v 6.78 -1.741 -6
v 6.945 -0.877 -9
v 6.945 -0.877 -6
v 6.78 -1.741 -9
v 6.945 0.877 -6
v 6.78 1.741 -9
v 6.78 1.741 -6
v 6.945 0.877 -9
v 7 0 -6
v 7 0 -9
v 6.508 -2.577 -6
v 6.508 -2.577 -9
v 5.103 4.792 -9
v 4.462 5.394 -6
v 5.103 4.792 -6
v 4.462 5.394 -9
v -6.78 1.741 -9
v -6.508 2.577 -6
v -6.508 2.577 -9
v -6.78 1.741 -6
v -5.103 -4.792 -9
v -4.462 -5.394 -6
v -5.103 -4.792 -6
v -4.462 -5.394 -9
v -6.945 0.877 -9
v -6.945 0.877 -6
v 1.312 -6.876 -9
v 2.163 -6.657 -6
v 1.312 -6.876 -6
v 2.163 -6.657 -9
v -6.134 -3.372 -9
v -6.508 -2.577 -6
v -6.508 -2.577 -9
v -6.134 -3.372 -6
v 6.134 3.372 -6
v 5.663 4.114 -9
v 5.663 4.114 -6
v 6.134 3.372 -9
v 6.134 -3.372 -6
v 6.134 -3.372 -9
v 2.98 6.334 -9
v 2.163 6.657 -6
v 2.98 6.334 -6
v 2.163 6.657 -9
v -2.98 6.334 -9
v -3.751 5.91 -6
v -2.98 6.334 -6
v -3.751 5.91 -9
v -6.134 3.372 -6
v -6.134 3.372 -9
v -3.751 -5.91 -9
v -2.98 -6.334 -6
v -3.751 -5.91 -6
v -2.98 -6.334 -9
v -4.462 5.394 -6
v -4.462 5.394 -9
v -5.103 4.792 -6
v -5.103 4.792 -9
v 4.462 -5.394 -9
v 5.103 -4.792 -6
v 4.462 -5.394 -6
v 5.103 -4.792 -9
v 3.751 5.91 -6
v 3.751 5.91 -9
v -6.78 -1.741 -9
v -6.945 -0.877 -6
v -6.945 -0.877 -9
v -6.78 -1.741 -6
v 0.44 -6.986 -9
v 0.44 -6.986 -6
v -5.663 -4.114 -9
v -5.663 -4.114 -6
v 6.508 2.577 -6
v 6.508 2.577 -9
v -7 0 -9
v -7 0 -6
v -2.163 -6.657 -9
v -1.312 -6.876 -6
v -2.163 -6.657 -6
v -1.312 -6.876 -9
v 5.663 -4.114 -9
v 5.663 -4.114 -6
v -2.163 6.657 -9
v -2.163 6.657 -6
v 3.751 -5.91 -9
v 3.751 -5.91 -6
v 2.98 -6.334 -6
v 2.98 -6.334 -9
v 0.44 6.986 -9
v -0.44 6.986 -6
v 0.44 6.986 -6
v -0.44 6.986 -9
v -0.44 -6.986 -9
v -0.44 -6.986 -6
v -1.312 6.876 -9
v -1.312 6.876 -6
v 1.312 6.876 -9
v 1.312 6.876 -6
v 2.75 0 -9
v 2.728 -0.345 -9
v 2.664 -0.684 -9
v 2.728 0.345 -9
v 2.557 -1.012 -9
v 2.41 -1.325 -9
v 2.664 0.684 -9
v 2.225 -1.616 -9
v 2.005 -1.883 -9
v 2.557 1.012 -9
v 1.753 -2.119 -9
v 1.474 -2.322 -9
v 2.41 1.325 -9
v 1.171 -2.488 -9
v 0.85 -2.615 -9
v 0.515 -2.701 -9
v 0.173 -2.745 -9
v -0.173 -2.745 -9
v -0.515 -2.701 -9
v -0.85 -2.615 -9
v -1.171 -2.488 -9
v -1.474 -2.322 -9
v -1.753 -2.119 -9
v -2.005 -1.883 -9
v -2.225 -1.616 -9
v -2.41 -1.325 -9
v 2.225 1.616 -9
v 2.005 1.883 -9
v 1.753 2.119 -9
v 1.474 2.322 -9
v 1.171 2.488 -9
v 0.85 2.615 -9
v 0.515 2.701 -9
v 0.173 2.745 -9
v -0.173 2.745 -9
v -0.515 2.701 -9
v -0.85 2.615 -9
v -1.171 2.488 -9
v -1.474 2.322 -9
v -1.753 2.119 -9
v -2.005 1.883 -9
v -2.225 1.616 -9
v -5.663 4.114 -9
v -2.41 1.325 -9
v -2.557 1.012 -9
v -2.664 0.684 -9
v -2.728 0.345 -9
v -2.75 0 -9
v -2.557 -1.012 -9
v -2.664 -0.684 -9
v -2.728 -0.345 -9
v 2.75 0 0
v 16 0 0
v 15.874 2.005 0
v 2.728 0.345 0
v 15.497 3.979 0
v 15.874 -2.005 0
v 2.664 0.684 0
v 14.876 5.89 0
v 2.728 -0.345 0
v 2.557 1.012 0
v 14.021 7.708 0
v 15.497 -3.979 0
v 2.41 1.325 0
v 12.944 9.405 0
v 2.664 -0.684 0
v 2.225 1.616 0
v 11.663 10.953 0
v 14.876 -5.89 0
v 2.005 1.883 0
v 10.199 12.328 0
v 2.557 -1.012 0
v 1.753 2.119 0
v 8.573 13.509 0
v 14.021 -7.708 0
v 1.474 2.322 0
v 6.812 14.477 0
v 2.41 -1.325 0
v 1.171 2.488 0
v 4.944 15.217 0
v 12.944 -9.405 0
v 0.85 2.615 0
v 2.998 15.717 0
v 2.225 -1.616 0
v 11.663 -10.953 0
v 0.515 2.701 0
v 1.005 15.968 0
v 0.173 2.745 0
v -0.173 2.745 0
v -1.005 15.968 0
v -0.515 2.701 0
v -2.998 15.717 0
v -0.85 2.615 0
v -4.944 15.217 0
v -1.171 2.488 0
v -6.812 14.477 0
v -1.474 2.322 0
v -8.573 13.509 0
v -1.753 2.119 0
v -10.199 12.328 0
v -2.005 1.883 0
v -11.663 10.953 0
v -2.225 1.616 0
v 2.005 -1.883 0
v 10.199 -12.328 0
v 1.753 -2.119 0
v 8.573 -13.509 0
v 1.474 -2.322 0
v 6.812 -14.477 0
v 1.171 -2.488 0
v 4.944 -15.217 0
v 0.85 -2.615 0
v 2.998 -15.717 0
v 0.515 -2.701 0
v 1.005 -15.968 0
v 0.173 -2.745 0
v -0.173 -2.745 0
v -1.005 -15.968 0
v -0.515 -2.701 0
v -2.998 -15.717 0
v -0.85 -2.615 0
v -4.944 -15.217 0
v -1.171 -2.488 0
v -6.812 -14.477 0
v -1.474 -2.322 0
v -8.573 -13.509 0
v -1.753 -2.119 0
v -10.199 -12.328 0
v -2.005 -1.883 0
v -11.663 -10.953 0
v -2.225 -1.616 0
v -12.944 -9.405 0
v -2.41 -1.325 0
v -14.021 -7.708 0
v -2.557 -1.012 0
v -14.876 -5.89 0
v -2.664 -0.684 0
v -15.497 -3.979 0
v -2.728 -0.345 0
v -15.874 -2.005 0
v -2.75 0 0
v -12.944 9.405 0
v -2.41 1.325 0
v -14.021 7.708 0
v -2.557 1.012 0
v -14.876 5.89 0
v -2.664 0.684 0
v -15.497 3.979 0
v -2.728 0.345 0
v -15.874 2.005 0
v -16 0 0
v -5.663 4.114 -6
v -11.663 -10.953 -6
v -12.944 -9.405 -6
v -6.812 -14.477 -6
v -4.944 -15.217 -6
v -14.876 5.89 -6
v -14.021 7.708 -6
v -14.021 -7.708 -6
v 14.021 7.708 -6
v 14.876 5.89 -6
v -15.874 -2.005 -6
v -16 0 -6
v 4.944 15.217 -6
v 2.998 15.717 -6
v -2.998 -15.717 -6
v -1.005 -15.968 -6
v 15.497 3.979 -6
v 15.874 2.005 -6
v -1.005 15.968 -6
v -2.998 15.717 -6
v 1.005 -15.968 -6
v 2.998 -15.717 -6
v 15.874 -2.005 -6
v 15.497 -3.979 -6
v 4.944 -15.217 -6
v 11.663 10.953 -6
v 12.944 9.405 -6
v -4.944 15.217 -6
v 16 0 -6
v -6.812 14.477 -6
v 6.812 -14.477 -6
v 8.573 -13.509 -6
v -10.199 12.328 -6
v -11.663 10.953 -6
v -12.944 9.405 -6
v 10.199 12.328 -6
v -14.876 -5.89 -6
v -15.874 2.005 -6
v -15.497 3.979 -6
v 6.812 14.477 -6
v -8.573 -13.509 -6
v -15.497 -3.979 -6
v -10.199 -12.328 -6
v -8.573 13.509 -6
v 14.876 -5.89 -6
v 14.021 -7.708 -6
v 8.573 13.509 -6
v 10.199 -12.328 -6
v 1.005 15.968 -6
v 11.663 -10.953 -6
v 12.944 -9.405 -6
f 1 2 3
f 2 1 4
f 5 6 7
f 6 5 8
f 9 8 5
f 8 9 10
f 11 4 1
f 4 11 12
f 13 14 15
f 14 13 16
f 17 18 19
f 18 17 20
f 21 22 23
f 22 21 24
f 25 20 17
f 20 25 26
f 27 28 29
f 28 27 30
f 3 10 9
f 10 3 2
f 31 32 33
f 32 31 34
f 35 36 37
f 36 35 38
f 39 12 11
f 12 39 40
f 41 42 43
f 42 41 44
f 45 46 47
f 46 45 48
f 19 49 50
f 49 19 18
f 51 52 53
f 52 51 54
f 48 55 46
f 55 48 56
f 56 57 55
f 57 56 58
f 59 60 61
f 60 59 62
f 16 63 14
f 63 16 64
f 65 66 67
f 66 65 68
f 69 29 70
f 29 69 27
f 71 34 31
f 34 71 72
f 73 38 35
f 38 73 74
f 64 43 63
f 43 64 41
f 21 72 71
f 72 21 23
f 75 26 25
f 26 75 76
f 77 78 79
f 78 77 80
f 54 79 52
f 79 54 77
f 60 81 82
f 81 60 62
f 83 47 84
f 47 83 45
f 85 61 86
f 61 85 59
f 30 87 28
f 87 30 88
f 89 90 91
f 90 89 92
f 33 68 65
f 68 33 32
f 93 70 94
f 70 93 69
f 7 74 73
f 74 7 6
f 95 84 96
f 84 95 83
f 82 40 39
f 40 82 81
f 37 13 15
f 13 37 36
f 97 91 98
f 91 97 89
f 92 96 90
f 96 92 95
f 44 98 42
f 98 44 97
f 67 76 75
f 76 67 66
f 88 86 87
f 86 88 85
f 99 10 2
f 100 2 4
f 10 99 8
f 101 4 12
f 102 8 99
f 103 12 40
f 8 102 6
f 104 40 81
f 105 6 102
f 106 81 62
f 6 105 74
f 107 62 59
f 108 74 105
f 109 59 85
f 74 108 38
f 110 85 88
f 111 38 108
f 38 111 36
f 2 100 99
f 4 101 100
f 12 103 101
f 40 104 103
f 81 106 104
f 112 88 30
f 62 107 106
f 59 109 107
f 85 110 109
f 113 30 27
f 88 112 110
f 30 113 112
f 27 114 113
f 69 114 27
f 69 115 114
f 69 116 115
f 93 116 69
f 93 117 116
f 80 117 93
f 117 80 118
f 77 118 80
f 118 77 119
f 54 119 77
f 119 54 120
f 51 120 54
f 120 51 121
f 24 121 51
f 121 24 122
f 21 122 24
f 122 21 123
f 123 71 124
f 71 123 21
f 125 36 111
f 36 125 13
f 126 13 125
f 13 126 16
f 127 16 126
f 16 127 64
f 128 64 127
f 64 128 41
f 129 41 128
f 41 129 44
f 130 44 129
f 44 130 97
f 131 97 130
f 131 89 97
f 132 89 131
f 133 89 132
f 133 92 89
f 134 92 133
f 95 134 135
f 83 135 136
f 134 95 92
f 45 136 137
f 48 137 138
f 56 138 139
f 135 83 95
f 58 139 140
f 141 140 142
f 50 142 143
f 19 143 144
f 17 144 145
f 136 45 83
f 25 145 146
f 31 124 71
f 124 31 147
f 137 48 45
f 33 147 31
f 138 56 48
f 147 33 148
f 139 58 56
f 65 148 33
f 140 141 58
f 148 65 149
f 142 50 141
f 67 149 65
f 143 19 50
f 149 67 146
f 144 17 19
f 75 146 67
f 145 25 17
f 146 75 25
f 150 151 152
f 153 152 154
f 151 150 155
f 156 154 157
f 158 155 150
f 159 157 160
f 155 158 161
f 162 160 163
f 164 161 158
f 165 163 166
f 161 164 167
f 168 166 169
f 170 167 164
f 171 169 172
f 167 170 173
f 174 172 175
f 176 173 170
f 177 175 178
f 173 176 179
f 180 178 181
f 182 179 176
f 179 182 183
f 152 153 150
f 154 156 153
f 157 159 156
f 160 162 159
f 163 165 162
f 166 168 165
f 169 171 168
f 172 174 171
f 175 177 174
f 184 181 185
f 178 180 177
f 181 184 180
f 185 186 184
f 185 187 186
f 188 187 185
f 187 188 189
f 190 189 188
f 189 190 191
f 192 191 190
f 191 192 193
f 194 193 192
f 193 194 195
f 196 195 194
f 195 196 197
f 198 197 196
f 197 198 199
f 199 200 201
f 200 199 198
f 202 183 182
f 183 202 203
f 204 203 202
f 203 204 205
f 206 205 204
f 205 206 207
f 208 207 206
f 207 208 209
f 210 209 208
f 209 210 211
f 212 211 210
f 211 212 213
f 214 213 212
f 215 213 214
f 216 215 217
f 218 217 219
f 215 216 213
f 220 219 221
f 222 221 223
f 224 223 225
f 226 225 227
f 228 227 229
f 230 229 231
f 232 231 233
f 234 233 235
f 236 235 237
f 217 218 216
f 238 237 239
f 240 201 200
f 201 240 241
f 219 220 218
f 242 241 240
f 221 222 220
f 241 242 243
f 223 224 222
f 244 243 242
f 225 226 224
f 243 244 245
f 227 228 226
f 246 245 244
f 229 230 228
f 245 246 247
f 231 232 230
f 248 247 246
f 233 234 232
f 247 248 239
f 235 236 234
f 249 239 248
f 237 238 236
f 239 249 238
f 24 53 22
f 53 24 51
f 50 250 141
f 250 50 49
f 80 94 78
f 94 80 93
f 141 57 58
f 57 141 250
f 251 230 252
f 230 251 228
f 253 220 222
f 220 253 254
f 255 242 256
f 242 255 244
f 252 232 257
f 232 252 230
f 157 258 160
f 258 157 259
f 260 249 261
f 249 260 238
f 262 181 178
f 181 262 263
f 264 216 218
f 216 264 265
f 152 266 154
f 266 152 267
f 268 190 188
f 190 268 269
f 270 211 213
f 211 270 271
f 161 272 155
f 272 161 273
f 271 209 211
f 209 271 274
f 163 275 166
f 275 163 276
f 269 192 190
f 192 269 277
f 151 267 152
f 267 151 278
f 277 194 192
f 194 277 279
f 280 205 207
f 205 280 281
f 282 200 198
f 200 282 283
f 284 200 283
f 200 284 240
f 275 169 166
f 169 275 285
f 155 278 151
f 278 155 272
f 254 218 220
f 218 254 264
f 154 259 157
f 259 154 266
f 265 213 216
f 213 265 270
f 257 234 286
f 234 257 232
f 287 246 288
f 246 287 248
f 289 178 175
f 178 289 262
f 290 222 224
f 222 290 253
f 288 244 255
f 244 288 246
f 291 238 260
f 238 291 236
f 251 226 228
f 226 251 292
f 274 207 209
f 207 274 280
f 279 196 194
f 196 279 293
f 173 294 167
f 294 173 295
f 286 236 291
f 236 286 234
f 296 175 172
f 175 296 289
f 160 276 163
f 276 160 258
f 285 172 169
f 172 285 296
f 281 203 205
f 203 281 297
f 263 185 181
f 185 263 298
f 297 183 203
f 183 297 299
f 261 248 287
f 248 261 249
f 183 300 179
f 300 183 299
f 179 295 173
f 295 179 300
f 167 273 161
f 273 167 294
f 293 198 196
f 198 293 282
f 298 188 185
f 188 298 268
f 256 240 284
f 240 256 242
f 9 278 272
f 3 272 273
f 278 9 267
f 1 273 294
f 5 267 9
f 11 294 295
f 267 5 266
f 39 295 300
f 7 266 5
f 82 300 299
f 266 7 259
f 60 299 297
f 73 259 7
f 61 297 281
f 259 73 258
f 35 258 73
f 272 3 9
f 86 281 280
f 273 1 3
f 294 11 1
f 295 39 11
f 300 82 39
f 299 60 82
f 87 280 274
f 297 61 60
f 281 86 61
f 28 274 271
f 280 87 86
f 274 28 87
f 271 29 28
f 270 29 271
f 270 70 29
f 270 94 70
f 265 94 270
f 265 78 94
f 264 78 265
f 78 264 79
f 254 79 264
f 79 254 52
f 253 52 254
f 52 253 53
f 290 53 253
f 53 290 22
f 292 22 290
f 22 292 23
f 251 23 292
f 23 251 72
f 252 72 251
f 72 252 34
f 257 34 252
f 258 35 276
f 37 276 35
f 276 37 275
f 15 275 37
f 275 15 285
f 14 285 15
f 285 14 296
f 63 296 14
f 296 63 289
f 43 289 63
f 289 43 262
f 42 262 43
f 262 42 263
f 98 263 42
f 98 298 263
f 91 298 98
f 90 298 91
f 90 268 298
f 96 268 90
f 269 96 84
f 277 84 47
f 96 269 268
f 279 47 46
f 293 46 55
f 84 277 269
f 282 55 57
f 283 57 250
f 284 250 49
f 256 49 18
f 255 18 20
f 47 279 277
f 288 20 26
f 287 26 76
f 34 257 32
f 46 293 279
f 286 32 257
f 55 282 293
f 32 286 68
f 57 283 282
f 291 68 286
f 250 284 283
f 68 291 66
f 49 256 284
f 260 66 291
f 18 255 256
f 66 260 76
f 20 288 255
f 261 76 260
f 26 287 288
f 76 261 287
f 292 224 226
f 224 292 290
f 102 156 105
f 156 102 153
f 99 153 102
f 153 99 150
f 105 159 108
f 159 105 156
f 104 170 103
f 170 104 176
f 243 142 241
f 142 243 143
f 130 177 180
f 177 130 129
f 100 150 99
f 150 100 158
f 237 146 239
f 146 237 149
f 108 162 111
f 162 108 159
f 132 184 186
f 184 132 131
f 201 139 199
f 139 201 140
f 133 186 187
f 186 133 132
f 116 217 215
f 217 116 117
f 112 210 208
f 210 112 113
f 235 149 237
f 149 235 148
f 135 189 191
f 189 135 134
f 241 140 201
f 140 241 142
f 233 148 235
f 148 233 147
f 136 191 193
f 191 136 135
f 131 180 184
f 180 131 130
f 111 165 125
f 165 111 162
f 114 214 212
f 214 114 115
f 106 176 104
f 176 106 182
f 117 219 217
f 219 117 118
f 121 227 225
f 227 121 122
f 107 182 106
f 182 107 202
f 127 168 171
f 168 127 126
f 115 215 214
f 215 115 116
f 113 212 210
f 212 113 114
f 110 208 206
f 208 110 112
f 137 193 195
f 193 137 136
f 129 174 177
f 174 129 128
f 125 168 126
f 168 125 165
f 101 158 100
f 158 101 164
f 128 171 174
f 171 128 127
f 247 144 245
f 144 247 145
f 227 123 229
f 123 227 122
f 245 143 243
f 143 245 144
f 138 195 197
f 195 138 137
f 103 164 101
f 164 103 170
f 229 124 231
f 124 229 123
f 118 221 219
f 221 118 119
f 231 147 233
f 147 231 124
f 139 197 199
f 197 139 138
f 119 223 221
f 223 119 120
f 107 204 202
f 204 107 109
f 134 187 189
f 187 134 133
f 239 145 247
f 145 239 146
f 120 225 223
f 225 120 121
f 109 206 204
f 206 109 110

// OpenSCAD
$fn = 50;


difference() {
	union() {
		translate(v = [0, 0, -9.0000000000]) {
			cylinder(h = 9, r = 7.0000000000);
		}
		translate(v = [0, 0, -6.0000000000]) {
			cylinder(h = 6, r = 16.0000000000);
		}
	}
	union() {
		#translate(v = [0, 0, -9]) {
			cylinder(h = 9, r = 2.7500000000);
		}
	}
}
